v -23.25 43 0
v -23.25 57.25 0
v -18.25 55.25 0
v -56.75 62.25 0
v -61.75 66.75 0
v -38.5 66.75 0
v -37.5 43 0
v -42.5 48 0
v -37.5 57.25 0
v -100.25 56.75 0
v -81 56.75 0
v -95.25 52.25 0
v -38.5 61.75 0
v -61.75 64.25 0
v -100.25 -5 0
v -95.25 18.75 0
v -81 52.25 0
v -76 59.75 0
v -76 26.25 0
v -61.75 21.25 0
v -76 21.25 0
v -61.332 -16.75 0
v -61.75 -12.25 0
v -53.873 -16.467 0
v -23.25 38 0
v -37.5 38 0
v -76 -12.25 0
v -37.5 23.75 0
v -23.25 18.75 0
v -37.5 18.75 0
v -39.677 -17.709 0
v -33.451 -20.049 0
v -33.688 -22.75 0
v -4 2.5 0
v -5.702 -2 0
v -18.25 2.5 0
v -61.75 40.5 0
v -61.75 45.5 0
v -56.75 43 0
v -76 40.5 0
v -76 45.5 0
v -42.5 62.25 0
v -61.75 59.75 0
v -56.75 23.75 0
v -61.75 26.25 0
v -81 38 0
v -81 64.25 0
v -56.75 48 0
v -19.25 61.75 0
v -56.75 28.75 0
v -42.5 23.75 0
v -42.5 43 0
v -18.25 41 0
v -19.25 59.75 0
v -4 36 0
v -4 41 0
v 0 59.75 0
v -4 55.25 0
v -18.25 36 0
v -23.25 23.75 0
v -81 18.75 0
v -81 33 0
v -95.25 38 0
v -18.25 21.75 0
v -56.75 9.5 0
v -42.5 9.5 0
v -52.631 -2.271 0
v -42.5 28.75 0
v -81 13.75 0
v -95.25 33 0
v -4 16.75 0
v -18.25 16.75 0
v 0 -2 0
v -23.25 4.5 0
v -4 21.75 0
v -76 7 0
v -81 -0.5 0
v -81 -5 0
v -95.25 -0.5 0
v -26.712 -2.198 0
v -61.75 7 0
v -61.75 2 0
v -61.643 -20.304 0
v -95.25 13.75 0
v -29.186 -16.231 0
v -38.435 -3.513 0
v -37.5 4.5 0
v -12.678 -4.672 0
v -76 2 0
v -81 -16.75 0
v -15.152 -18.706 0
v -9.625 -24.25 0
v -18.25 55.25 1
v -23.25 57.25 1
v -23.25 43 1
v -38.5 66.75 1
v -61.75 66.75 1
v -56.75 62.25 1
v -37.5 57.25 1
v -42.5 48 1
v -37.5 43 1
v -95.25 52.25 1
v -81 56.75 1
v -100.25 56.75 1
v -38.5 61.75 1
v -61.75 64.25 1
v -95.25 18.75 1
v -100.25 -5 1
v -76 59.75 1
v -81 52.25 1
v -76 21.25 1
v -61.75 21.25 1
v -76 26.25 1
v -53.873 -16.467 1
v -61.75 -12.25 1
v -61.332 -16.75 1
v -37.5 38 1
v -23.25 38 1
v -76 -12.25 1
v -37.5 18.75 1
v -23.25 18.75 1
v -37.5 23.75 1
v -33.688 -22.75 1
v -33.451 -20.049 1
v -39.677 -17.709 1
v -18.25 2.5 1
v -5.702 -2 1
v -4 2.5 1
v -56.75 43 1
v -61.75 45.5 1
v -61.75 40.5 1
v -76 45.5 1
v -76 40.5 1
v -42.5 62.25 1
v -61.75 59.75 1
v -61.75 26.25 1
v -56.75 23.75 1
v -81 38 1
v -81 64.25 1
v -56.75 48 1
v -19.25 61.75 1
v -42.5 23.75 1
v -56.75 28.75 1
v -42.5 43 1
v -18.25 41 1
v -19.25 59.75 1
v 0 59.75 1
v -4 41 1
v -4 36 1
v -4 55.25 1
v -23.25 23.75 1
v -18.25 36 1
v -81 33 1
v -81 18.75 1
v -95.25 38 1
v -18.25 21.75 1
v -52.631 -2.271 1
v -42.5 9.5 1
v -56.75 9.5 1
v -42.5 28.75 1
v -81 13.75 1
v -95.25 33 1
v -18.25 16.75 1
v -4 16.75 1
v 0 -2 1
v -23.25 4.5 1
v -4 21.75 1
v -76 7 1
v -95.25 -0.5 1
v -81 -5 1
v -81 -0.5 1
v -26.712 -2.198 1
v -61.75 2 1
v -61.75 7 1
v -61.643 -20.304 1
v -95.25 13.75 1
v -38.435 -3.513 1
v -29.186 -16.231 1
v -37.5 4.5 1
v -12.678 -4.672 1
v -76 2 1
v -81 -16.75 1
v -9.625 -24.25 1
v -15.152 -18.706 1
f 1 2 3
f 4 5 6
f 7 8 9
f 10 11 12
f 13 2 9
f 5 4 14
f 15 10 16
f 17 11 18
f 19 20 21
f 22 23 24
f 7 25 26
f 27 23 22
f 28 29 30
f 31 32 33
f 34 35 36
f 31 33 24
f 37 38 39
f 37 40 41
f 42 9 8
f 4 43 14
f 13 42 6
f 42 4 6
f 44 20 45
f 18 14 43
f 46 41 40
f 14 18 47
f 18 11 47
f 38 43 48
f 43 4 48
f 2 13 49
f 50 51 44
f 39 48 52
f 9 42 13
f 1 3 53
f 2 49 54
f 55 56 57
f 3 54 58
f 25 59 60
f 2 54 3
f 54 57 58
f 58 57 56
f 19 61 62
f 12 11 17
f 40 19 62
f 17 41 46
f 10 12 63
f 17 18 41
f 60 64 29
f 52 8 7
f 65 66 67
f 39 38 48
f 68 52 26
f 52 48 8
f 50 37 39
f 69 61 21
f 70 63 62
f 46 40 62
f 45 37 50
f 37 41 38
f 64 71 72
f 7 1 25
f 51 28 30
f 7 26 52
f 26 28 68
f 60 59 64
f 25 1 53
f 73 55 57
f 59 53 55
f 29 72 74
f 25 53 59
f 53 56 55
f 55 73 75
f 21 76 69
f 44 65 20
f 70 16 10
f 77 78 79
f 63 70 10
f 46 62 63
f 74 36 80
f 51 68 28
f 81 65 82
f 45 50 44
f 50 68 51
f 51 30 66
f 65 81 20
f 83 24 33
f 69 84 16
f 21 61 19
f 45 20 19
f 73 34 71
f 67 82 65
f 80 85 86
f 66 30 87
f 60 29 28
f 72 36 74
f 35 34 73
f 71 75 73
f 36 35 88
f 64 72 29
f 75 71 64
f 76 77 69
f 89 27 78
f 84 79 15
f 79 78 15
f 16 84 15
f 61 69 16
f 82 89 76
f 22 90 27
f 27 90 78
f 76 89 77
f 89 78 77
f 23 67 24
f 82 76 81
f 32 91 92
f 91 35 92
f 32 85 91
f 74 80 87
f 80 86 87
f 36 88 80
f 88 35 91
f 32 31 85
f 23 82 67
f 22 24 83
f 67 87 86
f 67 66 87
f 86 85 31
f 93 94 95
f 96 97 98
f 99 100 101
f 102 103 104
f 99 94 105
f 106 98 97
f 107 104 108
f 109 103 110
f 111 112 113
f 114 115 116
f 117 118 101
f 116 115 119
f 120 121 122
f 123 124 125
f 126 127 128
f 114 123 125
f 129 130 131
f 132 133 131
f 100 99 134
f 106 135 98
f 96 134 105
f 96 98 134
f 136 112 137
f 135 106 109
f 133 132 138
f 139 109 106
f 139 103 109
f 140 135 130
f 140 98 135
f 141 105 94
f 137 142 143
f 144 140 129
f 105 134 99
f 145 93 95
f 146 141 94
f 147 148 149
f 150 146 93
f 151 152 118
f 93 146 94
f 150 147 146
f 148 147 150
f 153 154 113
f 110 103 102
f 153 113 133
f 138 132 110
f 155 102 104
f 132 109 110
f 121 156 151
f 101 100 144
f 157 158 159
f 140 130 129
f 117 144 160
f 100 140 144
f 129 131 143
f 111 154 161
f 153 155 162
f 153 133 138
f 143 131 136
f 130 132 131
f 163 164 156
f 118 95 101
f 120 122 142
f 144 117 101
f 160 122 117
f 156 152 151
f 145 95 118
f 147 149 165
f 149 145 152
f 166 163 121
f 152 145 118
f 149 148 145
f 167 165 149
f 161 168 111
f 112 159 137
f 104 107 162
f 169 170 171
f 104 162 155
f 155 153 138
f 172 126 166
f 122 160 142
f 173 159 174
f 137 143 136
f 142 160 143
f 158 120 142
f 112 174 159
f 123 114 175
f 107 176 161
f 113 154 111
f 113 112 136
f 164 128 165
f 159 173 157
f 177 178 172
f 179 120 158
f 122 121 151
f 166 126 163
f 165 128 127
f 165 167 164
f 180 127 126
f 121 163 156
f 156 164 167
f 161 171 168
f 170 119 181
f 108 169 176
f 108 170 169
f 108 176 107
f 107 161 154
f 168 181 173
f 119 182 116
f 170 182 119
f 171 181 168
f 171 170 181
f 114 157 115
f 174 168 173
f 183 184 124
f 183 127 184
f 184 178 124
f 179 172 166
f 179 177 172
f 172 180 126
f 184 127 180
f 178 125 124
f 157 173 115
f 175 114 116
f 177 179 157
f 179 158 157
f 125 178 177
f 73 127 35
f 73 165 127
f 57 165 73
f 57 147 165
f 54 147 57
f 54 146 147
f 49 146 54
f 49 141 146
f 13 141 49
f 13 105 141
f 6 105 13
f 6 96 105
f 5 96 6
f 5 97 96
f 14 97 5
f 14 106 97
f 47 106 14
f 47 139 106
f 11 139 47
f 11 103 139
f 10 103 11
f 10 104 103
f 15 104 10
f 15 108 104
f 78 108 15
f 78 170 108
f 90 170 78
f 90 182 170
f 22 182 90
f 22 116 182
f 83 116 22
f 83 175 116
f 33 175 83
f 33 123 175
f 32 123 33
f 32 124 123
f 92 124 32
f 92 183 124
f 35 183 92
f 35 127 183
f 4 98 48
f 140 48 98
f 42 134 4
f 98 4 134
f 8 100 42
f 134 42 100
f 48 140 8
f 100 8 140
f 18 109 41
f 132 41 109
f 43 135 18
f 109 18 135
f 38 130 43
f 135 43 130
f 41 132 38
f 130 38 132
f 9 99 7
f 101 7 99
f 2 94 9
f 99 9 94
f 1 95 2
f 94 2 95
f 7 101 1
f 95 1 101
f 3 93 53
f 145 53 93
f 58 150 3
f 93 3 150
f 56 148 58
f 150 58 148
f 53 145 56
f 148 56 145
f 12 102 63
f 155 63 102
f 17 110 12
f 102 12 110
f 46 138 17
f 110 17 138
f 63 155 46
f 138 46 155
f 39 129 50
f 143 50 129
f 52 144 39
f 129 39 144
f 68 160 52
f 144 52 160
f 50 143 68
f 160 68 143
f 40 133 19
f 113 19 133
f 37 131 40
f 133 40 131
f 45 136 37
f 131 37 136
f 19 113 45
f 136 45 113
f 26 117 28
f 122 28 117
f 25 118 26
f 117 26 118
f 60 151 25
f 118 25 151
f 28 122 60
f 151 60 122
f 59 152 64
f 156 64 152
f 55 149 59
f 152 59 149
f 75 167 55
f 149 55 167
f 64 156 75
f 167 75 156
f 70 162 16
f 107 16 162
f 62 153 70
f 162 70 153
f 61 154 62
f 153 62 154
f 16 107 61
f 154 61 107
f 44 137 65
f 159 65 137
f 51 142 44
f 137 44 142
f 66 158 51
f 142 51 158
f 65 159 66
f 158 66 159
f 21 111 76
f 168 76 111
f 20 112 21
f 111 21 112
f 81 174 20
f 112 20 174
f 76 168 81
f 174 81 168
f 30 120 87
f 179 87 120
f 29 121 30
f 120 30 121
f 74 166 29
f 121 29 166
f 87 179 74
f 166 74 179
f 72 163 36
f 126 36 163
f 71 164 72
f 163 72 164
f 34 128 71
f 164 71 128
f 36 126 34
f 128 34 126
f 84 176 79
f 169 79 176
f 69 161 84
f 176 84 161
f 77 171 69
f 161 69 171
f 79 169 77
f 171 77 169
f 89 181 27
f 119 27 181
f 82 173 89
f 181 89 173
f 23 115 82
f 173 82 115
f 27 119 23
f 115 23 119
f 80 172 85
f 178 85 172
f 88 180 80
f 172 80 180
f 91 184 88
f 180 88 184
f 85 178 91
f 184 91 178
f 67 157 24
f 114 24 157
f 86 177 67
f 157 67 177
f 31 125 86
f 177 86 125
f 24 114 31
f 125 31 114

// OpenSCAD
mx_w = 14.25;
mx_h = 14.25;
mx_d = 10;

col_keys_count = 3;
col_keys_spacing_w = 2.5;
col_keys_spacing_h = 2.5;

placement_w = mx_w + col_keys_spacing_w * 2;
placement_h = mx_h + col_keys_spacing_h * 2;
placement_d = 1.5;
placement_padding = 2;

case_d = 12;

_1U = 1.0;
_1_25U = 1.25;

pro_micro_w = 18;
pro_micro_h = 33;

micro_usb_w = 8;
micro_usb_h = 3;

rp2040_zero_w = 18.5;
rp2040_zero_d = 24.5;
rp2040_zero_h = 1.5;

usb_c_w = 10;
usb_c_h = 3;

module switch_cutout() {
    square([mx_w, mx_h]);
}

module over_switch_cutout() {
    translate([-1, -2, 0])
    square([mx_w + 2, mx_h + 4]);
}

module switch_cuts_only(count, col_w) {
    dx0 = placement_padding + (col_w / 2 - (placement_w / 2));
    dy0 = placement_padding;
    
    
    translate([dx0, dy0])
    for (i = [0:1:count - 1]) {
        dy = col_keys_spacing_h + placement_h * i;
        translate([0, dy, 0])
            children();
    }
}

module keys_col(count, size = _1U, extra_pad = 0, offset_delta = 0) {
    col_h = count * placement_h + placement_padding * 2;
    col_w = placement_w * size + placement_padding * 2;

    if (offset_delta > 0) {
        switch_cuts_only(count, col_w) children();
    } else {
        difference() {
            union() {
                square([col_w, col_h]);
                
                // plug the hole
                translate([0, -extra_pad])
                square([col_w, extra_pad]);
            }
            switch_cuts_only(count, col_w) children();
        }
    }
}

module rows(offset_delta = 0) {
    row_offsets = [-2, 0, 5, 2.5 - placement_h, -5];
    col_counts = [3, 3, 3, 4, 3];
    extra_pads = [0, 0, 5, 0, 0];
    rows_count = len(row_offsets);

    for (i = [0:1:rows_count - 1]) {
        dx0 = placement_w * i;
        dy0 = row_offsets[i];
        count = col_counts[i];
        pad = extra_pads[i];
        translate([dx0, dy0, 0])
            keys_col(count, _1U, pad, offset_delta) children();
    }
}

module shift_key(offset_delta = 0) {
    translate([placement_w / 2, -placement_h - placement_padding * 2.5, 0])
    rotate([0, 0, 10])
    keys_col(1, _1_25U, 0, offset_delta) children();
}


module layer_key(offset_delta = 0) {
    translate([placement_w * 1.75, -placement_h - placement_padding * 1.75, 0])
    rotate([0, 0, 5])
    keys_col(1, _1_25U, 0, offset_delta) children();
}

module half(offset_delta = 0) {
    rows(offset_delta) children();
    shift_key(offset_delta) children();
    layer_key(offset_delta) children();
}

module left_plate(offset_delta = 0) {
    mirror([-1, 0, 0])
    half(offset_delta) children();
}

module right_plate(offset_delta = 0) {
    half(offset_delta) children();
}

module cable_hole() {
    union() {
        translate([placement_w / 2 - 2, placement_h * 3 + 10, 6])
        rotate([90, 0, 0])
        cylinder(h = 10, r = 3);
        
        rotate([0, 50, 0])
        translate([placement_w / 2 - 10, placement_h * 3, 10])
        cube([1, 15, 10]);
    }
}

module case_right() {
    
    difference() {
        difference() {
            // base
            linear_extrude(case_d)
            offset(delta = 2.5)
            right_plate();
            
            // cutout
            translate([0, 0, placement_d])
            linear_extrude(case_d)
            offset(delta = 0.75)
            right_plate();
        }
        
        // cable hole
        cable_hole();
    }
}

module plate() {
    cube([rp2040_zero_w, rp2040_zero_d, rp2040_zero_h]);
}

module plate_holder() {
    difference() {
        cube([20, 25, 4]);
        translate([2, -1, -0.5])
        cube([16, 24, 5]);
        translate([0.75, -0.25, 3]) plate();
    }
}

module controller_case() {
    
    c_w = pro_micro_w + placement_padding * 2;
    c_h = pro_micro_h + placement_padding * 4;
    
    difference() {
        // base
        linear_extrude(case_d)
        offset(delta = 2.5)
        square([c_w, c_h]);
        
        // cutout
        translate([0, 0, placement_d])
        linear_extrude(case_d)
        offset(delta = 0.75)
        square([c_w, c_h]);
        
        // usb hole
        translate([c_w / 2 - usb_c_w / 2, c_h, 6])
        cube([usb_c_w, 5, usb_c_h]);
    }
    rotate([0, 0, 180])
    translate([-21, -42, 0])
        plate_holder();
}


module case_left() {
    difference() {
        union() {
            translate([-126, 8, 0])
            controller_case();
            difference() {
                difference() {
                    // base
                    linear_extrude(case_d)
                    offset(delta = 2.5)
                    left_plate();
                    
                    // cutout
                    translate([0, 0, placement_d])
                    linear_extrude(case_d)
                    offset(delta = 0.75)
                    left_plate();
                }
                
                // part cable hole
                mirror([-1, 0, 0])
                cable_hole();

            }
        }
        // controller cable hold
        translate([-105, 12, 5])
        cube([10, 15, 4]);
        
        translate([-105, 15, 5])
        rotate([45, 0, 0,])
        cube([10, 1, 10]);
    }
}

module led_cover(h) {
    difference() {
        cube([23, 41, h], center = true);
        cube([12, 32, h * 2], center = true);
    }
}

module led_top_cover(h) {
    difference() {
        cube([27, 46, h], center = true);
        cube([12, 32, h * 2], center = true);
    }

}

module right_top_cover() {
    difference() {
        linear_extrude(4)
        offset(delta = 5)
        right_plate();
        translate([0, 0, -1])
        linear_extrude(4)
        offset(delta = 3.5)
        right_plate();
        
        translate([0, 0, 1])
        linear_extrude(4)
        right_plate(offset_delta = 1) over_switch_cutout();
    }
}

module right_top_cover_v2(h) {
    difference() {
        linear_extrude(h)
        offset(delta = 2.5)
        right_plate();
        
        translate([0, 0, -1])
        linear_extrude(h + 2)
        right_plate(offset_delta = 1) over_switch_cutout();
    }
}

module left_top_cover_v2(h) {
    union() {
        difference() {
            linear_extrude(h)
            offset(delta = 2.5)
            left_plate();
            
            translate([0, 0, -1])
            linear_extrude(h + 2)
            left_plate(offset_delta = 1) over_switch_cutout();
        }

        translate([-115, 28.5, 0.25])
        led_top_cover(h);
    }
}

// Right case part
//case_right();
//translate([0, 0, 11])
//linear_extrude(1) right_plate() switch_cutout();

//#case_right();
//translate([0, 0, 11])
//#right_plate() switch_cutout();
//translate([0, 0, 13])
//right_top_cover_v2(h = 0.56);


// Left case with controller holder
//case_left();
//translate([0, 0, 11])
linear_extrude(1) left_plate() switch_cutout();
//translate([-115, 29, 11])
//#led_cover(h = 1);
//
//translate([0, 0, 13])
//left_top_cover_v2(h = 0.56);


// Left and right are the same, just mirror then printing, for example:
//linear_extrude(placement_d)
//right_plate() switch_cutout();
